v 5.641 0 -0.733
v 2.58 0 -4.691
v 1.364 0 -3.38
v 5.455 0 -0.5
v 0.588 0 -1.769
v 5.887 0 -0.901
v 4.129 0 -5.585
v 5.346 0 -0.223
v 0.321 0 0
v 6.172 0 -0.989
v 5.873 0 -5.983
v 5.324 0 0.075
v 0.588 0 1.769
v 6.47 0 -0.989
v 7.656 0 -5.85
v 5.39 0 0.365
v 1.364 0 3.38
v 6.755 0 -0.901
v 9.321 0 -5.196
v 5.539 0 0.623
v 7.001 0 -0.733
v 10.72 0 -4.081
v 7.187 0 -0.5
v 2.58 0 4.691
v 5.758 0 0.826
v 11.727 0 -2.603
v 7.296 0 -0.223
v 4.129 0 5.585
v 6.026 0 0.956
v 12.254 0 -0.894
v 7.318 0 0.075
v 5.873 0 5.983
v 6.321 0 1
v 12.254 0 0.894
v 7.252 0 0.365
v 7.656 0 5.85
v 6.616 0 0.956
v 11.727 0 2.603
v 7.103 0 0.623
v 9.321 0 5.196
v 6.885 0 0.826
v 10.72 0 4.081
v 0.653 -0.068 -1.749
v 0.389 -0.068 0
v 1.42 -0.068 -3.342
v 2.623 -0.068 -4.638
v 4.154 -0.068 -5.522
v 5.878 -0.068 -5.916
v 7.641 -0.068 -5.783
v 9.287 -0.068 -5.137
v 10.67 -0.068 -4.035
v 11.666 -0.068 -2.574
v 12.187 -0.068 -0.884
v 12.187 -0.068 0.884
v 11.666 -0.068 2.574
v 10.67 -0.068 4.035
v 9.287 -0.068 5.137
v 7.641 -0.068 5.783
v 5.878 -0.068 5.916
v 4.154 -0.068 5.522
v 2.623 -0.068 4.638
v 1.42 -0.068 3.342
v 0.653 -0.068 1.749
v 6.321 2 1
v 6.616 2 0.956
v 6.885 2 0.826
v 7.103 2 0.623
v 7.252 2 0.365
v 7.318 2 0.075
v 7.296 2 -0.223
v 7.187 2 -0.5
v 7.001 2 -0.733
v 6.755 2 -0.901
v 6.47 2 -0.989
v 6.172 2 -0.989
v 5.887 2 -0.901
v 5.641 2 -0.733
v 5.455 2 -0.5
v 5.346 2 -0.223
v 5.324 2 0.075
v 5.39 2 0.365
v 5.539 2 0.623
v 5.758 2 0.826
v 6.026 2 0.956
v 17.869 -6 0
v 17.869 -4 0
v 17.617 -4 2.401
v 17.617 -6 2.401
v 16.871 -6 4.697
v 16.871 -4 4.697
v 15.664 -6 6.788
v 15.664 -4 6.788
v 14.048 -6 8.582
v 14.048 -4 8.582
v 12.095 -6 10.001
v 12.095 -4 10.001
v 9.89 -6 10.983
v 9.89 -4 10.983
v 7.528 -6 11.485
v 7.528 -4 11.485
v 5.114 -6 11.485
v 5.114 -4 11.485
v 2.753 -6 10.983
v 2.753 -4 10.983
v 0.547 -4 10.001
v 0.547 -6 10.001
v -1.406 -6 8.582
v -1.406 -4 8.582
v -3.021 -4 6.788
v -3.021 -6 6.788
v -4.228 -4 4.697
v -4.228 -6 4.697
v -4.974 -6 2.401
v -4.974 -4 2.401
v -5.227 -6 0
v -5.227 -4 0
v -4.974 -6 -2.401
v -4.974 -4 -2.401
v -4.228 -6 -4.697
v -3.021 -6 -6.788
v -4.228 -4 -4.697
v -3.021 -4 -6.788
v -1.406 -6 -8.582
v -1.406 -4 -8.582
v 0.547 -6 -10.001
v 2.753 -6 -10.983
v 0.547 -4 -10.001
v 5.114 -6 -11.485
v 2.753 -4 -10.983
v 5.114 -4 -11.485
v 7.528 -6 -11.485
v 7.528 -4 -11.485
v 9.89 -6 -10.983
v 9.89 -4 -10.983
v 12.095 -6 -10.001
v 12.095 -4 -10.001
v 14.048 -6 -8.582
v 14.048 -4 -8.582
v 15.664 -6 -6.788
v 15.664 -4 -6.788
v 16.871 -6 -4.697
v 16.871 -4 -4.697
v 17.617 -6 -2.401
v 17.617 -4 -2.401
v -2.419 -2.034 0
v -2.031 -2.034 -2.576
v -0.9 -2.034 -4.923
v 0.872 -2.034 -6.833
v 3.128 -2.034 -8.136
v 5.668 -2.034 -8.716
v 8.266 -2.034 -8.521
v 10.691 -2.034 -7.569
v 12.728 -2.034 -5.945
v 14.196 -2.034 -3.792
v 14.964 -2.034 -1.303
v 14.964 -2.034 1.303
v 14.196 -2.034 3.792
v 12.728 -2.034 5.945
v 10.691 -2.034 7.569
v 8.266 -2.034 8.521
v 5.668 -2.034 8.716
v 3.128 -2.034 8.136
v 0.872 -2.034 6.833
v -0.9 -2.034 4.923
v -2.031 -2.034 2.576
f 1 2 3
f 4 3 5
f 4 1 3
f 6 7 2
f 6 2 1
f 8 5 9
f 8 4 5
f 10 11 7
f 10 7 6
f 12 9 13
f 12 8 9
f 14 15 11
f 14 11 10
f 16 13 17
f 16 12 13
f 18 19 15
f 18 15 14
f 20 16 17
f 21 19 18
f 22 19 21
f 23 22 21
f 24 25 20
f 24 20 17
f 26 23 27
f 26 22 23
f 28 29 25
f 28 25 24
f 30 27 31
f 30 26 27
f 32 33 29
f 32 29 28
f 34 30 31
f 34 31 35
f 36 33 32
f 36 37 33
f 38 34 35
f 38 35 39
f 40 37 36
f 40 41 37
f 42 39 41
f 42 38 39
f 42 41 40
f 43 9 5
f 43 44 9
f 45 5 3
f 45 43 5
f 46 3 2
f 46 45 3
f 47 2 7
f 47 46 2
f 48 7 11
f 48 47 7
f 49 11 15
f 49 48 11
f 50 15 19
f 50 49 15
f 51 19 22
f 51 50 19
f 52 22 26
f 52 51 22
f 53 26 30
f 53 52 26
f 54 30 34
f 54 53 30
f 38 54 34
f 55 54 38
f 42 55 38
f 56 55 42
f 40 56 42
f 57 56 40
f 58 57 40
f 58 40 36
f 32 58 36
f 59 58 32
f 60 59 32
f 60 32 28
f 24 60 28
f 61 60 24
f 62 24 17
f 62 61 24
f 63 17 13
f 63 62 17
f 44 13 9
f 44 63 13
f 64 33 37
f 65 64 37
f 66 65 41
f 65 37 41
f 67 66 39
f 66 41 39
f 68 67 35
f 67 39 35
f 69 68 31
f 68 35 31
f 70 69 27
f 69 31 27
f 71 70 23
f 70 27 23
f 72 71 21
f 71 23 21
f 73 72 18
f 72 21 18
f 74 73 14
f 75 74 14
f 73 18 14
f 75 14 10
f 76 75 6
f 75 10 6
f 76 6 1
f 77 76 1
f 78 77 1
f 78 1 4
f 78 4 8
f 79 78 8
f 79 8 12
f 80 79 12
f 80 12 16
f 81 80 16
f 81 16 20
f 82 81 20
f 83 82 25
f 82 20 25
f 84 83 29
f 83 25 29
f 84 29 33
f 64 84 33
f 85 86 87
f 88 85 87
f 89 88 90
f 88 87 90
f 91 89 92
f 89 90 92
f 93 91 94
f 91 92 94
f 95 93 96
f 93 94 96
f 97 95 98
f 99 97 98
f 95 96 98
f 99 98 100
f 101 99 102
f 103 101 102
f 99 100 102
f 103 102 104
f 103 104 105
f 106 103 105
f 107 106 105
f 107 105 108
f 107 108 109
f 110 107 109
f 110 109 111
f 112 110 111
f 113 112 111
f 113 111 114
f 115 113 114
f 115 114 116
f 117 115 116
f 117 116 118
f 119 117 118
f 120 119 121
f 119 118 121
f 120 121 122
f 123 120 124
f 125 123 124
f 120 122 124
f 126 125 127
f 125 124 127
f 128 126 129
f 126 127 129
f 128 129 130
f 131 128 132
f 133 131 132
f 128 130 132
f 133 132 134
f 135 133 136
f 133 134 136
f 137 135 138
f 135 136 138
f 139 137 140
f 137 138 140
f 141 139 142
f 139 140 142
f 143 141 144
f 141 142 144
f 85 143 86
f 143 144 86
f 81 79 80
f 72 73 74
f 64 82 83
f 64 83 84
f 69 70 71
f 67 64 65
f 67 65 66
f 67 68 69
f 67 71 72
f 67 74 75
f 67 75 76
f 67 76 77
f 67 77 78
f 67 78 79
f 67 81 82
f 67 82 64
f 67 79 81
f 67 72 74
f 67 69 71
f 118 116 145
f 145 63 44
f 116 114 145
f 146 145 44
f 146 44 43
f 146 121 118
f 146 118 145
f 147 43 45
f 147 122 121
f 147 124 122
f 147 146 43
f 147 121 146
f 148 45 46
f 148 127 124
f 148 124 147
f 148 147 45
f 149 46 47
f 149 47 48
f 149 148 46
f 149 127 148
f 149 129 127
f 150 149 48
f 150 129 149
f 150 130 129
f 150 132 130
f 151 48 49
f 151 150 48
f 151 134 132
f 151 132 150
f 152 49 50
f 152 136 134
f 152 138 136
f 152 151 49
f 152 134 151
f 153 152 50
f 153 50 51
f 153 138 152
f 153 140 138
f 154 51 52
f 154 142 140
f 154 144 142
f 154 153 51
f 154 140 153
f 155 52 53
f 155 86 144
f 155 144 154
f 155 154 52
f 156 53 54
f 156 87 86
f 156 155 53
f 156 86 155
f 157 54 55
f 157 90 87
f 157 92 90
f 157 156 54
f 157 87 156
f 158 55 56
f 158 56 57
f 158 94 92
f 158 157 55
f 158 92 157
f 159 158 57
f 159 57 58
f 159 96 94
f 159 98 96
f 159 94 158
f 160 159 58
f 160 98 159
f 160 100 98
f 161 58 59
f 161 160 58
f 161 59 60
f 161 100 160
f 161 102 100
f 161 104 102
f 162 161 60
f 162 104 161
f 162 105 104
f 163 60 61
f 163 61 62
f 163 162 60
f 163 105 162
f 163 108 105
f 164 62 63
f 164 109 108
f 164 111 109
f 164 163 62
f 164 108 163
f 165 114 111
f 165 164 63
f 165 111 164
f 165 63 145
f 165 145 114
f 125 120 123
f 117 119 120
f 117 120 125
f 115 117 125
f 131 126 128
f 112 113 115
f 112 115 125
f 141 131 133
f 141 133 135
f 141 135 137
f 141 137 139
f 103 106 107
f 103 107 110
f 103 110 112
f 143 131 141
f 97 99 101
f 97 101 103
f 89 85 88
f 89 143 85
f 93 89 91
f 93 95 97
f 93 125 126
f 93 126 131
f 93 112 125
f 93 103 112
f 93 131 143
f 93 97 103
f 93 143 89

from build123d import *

# Parameters (mm, degrees)
SKETCH11_R          = 12
BOSS_EXTRUDE3_DEPTH = 2
SKETCH13_R          = 11.54797541
BOSS_EXTRUDE4_DEPTH = 2
SKETCH14_R          = 1
BOSS_EXTRUDE5_DEPTH = 2


with BuildPart() as part:
    # Sketch1 → Revolve1 (revolve)
    with BuildSketch(Plane.XY):
        Polygon((0.388993331, -0.067795133), (-5.226777212, -4), (6.321198199, -4), (6.321198199, 6), (-5.678801801, 6), align=None)
    revolve(axis=Axis((6.321198199, 11.047707555, 0), (0, -1, 0)))


with BuildPart() as body_2:
    # Split2: the piece on the far side of the plane
    add(part.part)
    split(bisect_by=Plane.ZX, keep=Keep.BOTTOM)

    # Sketch13 → Boss-Extrude4 (add)
    with BuildSketch(Plane.XZ.offset(4)):
        with Locations((6.321198199, 0)):
            Circle(SKETCH13_R)
    extrude(amount=BOSS_EXTRUDE4_DEPTH)

    # Sketch14 → Boss-Extrude5 (add)
    with BuildSketch(Plane(origin=(0, 0, 0), x_dir=(1, 0, 0), z_dir=(0, 1, 0))):
        with Locations(Location((6.321198199, 0, 0), (0, 0, 270))):
            Circle(SKETCH14_R)
    extrude(amount=BOSS_EXTRUDE5_DEPTH)


with BuildPart() as part_1:
    add(part.part)

    # Split2
    split(bisect_by=Plane.ZX, keep=Keep.TOP)

    # Sketch11 → Boss-Extrude3 (add)
    with BuildSketch(Plane(origin=(0, 6, 0), x_dir=(1, 0, 0), z_dir=(0, 1, 0))):
        with Locations(Location((6.321198199, 0, 0), (0, 0, 180))):
            Circle(SKETCH11_R)
    extrude(amount=BOSS_EXTRUDE3_DEPTH)


solid = body_2.part
